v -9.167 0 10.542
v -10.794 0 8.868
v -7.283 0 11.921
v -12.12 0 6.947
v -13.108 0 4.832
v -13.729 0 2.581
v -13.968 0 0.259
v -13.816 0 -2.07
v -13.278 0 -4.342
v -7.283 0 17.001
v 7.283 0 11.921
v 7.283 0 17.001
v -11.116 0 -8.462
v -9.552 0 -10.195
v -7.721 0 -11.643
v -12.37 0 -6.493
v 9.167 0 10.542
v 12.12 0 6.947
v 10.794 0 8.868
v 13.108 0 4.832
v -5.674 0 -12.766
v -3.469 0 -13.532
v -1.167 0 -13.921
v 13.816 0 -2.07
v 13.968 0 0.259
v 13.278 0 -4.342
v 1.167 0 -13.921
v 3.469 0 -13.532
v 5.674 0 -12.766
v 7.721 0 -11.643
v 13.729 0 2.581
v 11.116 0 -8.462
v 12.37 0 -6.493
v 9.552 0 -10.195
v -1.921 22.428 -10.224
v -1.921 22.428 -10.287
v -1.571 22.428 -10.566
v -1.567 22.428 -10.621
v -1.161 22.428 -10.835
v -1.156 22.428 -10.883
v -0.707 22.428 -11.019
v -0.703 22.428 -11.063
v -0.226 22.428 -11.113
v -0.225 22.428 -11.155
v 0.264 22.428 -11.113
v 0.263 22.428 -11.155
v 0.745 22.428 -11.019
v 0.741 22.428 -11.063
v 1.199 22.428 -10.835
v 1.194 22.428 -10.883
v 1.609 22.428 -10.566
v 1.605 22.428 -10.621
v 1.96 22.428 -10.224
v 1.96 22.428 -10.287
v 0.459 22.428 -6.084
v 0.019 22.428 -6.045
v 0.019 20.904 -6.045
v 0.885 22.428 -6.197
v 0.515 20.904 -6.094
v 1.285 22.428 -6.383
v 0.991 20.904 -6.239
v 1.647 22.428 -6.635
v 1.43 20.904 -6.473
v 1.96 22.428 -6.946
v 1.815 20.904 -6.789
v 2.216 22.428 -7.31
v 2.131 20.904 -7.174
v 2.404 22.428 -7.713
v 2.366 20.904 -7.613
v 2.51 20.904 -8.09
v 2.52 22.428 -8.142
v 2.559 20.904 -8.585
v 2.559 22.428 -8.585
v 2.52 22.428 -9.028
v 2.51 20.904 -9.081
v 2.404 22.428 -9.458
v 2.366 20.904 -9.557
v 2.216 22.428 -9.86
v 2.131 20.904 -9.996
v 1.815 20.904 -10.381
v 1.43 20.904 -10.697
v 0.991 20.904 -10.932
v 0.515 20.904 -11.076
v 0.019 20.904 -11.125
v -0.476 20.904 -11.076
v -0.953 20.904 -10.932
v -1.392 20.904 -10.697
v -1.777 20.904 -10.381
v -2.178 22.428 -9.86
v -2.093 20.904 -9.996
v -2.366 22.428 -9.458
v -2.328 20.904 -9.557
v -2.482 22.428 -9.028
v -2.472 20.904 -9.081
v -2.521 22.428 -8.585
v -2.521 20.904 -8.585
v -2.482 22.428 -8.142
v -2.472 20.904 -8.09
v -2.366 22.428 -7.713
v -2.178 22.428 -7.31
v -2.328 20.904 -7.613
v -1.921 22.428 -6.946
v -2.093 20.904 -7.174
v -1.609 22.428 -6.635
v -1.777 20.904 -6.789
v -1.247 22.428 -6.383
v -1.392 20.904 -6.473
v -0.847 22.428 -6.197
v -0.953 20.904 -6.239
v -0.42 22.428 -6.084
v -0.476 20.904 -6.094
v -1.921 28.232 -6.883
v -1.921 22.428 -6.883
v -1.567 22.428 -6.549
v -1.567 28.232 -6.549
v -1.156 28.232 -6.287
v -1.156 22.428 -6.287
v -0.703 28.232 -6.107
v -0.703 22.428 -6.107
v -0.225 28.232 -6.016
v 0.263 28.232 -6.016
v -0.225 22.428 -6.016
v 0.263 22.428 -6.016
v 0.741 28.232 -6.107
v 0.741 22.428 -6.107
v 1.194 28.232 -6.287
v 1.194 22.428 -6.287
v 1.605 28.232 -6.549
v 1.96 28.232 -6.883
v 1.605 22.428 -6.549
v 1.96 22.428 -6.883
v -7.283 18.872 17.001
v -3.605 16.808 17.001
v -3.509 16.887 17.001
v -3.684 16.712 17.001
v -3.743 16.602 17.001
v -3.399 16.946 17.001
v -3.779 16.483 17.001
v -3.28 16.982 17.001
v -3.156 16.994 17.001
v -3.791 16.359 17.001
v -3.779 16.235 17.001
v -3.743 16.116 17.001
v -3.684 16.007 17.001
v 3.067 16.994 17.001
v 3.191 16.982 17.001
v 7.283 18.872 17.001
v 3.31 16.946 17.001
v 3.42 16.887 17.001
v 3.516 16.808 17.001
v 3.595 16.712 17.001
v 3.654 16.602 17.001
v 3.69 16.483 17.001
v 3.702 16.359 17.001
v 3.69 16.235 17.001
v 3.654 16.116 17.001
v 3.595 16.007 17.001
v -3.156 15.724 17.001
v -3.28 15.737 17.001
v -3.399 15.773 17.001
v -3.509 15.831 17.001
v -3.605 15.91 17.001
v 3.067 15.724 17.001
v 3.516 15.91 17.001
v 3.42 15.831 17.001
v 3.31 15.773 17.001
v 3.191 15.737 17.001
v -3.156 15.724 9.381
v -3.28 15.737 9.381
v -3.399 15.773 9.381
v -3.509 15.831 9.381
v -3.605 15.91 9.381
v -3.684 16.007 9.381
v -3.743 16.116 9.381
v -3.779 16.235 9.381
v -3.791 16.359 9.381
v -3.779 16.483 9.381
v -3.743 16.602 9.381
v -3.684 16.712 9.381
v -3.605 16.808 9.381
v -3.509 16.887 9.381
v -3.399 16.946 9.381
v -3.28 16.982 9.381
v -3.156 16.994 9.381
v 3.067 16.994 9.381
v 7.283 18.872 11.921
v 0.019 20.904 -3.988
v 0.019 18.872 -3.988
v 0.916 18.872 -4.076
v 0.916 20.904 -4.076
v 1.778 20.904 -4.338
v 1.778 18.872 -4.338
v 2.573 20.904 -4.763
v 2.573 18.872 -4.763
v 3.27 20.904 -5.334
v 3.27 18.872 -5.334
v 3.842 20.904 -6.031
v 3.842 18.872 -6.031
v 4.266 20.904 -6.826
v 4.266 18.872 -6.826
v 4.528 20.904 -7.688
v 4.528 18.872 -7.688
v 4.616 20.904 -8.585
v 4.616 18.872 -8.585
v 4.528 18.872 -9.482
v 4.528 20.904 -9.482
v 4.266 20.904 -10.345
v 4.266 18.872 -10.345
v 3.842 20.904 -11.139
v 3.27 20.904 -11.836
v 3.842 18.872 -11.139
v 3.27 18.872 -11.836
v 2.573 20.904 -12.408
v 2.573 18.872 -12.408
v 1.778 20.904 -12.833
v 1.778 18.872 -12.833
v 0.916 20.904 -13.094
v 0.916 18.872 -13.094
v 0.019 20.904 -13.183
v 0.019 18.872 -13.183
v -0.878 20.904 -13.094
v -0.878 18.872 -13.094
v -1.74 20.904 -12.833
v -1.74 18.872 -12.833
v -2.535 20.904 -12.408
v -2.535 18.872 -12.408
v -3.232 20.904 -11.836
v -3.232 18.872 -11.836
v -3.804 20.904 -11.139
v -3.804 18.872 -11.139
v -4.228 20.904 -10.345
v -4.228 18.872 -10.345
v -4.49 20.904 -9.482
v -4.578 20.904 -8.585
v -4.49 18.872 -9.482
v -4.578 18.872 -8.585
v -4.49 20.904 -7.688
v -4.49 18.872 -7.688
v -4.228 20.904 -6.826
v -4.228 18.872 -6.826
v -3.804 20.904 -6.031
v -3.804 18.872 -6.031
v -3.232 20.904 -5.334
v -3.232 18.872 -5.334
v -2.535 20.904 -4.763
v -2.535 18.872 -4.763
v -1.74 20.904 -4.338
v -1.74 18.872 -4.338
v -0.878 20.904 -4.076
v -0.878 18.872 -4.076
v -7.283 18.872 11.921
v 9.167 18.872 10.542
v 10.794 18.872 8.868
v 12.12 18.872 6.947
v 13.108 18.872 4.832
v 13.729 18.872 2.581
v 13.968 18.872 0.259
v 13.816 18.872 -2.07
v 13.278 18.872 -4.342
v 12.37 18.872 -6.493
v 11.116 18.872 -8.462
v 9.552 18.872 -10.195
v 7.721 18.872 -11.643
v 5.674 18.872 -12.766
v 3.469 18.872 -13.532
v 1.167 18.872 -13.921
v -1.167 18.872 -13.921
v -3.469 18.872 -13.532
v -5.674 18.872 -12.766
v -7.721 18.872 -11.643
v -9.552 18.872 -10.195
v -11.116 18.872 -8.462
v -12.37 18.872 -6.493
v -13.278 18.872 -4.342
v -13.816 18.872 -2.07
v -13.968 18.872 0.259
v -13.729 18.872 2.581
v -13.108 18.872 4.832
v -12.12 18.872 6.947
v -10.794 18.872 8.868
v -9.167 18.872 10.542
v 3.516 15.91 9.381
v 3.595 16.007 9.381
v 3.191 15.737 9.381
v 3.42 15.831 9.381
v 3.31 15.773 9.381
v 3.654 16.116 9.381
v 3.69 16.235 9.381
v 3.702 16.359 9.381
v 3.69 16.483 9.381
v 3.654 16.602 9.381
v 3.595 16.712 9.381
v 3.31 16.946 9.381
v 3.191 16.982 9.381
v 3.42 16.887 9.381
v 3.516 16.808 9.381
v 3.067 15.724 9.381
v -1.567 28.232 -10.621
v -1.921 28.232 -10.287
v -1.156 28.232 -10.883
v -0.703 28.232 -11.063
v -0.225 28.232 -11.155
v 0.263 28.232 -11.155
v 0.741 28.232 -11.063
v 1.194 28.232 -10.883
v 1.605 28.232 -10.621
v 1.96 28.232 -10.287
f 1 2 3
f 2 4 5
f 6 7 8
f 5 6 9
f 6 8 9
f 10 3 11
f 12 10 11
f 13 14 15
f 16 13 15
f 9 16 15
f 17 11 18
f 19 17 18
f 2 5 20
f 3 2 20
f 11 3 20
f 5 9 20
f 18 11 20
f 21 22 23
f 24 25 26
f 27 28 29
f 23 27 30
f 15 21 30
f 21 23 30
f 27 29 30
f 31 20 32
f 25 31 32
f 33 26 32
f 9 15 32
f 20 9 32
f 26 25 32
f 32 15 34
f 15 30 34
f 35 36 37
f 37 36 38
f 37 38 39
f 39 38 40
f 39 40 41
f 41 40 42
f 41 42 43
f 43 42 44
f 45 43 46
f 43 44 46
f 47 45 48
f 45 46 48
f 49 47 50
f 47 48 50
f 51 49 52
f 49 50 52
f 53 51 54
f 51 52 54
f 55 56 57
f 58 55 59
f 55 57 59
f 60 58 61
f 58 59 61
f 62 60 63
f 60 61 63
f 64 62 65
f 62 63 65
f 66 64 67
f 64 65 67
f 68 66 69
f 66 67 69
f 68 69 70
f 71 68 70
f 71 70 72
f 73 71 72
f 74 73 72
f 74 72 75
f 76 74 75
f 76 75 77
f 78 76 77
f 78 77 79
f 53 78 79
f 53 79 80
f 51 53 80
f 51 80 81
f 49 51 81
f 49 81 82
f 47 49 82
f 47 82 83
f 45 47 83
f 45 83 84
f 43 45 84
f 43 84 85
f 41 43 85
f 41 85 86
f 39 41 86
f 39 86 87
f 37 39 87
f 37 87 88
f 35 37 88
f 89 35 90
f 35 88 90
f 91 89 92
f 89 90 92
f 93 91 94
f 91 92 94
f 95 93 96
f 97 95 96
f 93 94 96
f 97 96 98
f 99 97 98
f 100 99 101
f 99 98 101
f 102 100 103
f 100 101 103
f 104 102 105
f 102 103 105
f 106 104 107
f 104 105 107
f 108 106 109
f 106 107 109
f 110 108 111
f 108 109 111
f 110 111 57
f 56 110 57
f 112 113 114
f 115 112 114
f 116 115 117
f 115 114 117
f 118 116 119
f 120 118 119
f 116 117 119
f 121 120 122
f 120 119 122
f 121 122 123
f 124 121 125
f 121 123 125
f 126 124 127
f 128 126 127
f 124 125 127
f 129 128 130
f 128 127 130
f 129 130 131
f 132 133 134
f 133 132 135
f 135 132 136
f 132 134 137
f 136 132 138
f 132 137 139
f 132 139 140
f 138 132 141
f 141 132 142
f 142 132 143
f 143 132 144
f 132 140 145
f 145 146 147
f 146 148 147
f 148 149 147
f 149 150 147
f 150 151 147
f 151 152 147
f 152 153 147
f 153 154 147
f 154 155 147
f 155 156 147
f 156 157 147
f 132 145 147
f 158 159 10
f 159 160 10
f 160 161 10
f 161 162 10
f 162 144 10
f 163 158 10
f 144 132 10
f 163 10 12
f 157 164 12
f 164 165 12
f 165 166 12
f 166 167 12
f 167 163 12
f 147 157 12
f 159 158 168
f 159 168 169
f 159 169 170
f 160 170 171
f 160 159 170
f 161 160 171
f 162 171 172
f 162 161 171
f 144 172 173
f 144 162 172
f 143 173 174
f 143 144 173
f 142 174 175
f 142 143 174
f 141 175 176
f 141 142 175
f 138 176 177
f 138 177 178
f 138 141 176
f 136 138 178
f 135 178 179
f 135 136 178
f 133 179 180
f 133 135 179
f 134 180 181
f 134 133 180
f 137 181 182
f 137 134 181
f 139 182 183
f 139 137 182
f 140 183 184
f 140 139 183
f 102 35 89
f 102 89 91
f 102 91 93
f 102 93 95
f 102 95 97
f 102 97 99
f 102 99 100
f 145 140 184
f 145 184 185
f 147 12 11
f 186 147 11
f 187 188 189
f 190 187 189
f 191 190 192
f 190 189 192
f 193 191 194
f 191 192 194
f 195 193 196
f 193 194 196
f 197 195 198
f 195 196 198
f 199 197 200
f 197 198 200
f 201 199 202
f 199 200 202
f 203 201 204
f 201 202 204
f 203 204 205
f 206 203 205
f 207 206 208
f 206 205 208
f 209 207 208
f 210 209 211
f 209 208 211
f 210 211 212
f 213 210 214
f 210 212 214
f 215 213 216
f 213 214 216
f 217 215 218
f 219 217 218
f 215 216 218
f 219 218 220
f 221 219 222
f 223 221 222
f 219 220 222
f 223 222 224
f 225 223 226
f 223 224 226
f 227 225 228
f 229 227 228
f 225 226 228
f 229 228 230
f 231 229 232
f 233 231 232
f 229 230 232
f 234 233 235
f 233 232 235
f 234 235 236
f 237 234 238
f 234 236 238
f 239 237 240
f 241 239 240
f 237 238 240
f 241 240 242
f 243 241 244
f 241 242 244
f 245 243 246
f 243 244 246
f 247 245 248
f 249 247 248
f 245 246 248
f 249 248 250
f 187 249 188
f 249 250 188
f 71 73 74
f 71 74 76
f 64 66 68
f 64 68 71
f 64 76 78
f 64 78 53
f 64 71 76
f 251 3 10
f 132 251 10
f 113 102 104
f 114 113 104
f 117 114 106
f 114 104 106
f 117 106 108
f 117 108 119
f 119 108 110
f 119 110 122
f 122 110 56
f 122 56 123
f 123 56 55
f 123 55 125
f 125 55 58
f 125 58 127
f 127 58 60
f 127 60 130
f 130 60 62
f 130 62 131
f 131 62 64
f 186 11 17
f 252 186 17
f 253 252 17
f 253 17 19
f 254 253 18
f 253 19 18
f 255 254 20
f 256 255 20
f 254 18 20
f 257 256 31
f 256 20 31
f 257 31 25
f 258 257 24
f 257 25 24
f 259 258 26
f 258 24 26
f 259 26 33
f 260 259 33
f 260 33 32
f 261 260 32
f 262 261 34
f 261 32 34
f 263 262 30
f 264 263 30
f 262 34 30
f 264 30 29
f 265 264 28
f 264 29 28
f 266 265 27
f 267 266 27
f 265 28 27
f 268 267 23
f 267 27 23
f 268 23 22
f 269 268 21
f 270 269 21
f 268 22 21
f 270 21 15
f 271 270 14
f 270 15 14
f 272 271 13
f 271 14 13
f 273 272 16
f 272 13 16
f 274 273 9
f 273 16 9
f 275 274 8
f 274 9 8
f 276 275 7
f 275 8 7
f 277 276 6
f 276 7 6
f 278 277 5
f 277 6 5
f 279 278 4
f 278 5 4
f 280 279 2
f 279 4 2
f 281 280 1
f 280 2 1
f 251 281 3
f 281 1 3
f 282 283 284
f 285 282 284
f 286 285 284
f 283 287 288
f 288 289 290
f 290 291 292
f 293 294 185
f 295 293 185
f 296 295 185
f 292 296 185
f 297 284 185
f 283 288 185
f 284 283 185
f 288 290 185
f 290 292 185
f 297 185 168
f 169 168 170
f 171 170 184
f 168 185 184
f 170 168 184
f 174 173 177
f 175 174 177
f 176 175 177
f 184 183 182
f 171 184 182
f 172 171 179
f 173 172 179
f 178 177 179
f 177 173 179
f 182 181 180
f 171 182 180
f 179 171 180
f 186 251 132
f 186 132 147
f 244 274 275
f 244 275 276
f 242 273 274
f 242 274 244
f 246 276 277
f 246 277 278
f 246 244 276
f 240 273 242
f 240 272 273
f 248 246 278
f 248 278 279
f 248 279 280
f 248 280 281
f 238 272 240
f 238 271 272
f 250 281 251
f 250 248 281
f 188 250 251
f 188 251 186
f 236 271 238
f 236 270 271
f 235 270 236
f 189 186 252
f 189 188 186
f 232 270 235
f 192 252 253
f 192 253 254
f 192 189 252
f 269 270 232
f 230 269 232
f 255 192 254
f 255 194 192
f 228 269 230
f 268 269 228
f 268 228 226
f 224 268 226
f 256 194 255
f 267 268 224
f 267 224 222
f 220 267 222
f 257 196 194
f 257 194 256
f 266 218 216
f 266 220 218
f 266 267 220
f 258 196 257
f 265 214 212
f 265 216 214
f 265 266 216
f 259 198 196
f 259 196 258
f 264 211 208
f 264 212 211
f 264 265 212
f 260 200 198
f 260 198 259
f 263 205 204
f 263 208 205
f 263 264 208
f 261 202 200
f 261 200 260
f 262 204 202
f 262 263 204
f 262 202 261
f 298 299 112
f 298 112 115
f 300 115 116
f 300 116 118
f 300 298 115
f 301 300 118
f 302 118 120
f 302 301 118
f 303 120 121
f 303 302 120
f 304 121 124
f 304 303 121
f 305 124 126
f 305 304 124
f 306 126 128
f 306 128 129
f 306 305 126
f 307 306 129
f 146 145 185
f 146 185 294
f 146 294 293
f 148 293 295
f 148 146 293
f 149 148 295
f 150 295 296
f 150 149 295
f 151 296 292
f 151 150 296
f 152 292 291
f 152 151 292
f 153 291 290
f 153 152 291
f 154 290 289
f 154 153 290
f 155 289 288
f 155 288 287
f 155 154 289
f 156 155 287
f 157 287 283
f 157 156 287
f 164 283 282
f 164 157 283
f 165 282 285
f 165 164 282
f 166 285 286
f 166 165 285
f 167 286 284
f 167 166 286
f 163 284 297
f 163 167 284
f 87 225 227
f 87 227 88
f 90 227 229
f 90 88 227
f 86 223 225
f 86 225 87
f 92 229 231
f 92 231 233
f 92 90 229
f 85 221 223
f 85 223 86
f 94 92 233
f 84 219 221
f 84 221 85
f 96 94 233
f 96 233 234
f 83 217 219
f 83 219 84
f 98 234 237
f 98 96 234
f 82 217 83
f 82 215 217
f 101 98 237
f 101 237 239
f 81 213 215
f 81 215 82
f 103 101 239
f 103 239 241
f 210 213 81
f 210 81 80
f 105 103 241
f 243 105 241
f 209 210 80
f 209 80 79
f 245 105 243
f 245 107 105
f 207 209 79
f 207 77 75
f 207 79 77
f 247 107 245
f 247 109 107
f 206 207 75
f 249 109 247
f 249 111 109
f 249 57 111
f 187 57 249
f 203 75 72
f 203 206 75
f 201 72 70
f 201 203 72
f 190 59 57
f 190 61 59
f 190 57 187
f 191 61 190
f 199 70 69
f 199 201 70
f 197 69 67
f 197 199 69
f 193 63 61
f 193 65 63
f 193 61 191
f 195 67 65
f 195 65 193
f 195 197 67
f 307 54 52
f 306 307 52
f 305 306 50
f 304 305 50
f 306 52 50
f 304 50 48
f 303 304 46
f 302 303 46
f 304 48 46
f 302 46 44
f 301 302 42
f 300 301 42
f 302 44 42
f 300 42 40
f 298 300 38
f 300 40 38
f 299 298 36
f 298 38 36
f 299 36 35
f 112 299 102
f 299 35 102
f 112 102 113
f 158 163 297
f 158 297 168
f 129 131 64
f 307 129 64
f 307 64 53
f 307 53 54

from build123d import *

# Parameters (mm, degrees)
BOSS_EXTRUDE1_DEPTH = 18.8722
SKETCH3_R           = 4.5974
SKETCH3_R_2         = 2.54
BOSS_EXTRUDE2_DEPTH = 2.032
SKETCH3_2_R         = 4.5974
SKETCH3_2_R_2       = 2.54
BOSS_EXTRUDE3_DEPTH = 2.032
SKETCH4_R           = 2.54
BOSS_EXTRUDE4_DEPTH = 3.556
BOSS_EXTRUDE5_DEPTH = 5.8039
CUT_EXTRUDE1_DEPTH  = 7.62


with BuildPart() as part:
    # Sketch1 → Boss-Extrude1 (new body)
    with BuildSketch(Plane(origin=(0, 0, 0), x_dir=(1, 0, 0), z_dir=(0, 1, 0))):
        with BuildLine():
            Line((-7.28345, -11.921084519), (-7.28345, -17.001084519))
            Line((-7.28345, -17.001084519), (7.28345, -17.001084519))
            Line((7.28345, -17.001084519), (7.28345, -11.921084519))
            ThreePointArc((7.28345, -11.921084519), (0, 13.97), (-7.28345, -11.921084519))
        make_face()
    extrude(amount=BOSS_EXTRUDE1_DEPTH)

    # Sketch3 → Boss-Extrude2 (add)
    with BuildSketch(Plane(origin=(0, 18.8722, 0), x_dir=(1, 0, 0), z_dir=(0, 1, 0))):
        with Locations((0.01905, 8.585233697)):
            Circle(SKETCH3_R)
        with Locations((0.01905, 8.585233697)):
            Circle(SKETCH3_R_2, mode=Mode.SUBTRACT)
    extrude(amount=BOSS_EXTRUDE2_DEPTH)

    # Sketch3<2> → Boss-Extrude3 (add)
    with BuildSketch(Plane(origin=(0, 18.8722, 0), x_dir=(1, 0, 0), z_dir=(0, 1, 0))):
        with Locations((0.01905, 8.585233697)):
            Circle(SKETCH3_2_R)
        with Locations((0.01905, 8.585233697)):
            Circle(SKETCH3_2_R_2, mode=Mode.SUBTRACT)
    extrude(amount=BOSS_EXTRUDE3_DEPTH)

    # Sketch4 → Boss-Extrude4 (add)
    with BuildSketch(Plane(origin=(0, 18.8722, 0), x_dir=(1, 0, 0), z_dir=(0, 1, 0))):
        with Locations((0.01905, 8.585233697)):
            Circle(SKETCH4_R)
    extrude(amount=BOSS_EXTRUDE4_DEPTH)

    # Sketch5 → Boss-Extrude5 (add)
    with BuildSketch(Plane(origin=(0, 22.4282, 0), x_dir=(1, 0, 0), z_dir=(0, 1, 0))):
        with BuildLine():
            Line((-1.921484266, 10.287033697), (-1.921484266, 6.883433697))
            ThreePointArc((-1.921484266, 6.883433697), (0.01905, 6.00418808), (1.959584266, 6.883433697))
            Line((1.959584266, 6.883433697), (1.959584266, 10.287033697))
            ThreePointArc((1.959584266, 10.287033697), (0.01905, 11.166279314), (-1.921484266, 10.287033697))
        make_face()
    extrude(amount=BOSS_EXTRUDE5_DEPTH)

    # Sketch6 → Cut-Extrude1 (cut)
    with BuildSketch(Plane.XY.offset(17.001084519)):
        with BuildLine():
            Line((-3.15595, 16.994300905), (3.06705, 16.994300905))
            ThreePointArc((3.06705, 16.994300905), (3.70205, 16.359300905), (3.06705, 15.724300905))
            Line((3.06705, 15.724300905), (-3.15595, 15.724300905))
            ThreePointArc((-3.15595, 15.724300905), (-3.79095, 16.359300905), (-3.15595, 16.994300905))
        make_face()
    extrude(amount=-CUT_EXTRUDE1_DEPTH, mode=Mode.SUBTRACT)


solid = part.part
